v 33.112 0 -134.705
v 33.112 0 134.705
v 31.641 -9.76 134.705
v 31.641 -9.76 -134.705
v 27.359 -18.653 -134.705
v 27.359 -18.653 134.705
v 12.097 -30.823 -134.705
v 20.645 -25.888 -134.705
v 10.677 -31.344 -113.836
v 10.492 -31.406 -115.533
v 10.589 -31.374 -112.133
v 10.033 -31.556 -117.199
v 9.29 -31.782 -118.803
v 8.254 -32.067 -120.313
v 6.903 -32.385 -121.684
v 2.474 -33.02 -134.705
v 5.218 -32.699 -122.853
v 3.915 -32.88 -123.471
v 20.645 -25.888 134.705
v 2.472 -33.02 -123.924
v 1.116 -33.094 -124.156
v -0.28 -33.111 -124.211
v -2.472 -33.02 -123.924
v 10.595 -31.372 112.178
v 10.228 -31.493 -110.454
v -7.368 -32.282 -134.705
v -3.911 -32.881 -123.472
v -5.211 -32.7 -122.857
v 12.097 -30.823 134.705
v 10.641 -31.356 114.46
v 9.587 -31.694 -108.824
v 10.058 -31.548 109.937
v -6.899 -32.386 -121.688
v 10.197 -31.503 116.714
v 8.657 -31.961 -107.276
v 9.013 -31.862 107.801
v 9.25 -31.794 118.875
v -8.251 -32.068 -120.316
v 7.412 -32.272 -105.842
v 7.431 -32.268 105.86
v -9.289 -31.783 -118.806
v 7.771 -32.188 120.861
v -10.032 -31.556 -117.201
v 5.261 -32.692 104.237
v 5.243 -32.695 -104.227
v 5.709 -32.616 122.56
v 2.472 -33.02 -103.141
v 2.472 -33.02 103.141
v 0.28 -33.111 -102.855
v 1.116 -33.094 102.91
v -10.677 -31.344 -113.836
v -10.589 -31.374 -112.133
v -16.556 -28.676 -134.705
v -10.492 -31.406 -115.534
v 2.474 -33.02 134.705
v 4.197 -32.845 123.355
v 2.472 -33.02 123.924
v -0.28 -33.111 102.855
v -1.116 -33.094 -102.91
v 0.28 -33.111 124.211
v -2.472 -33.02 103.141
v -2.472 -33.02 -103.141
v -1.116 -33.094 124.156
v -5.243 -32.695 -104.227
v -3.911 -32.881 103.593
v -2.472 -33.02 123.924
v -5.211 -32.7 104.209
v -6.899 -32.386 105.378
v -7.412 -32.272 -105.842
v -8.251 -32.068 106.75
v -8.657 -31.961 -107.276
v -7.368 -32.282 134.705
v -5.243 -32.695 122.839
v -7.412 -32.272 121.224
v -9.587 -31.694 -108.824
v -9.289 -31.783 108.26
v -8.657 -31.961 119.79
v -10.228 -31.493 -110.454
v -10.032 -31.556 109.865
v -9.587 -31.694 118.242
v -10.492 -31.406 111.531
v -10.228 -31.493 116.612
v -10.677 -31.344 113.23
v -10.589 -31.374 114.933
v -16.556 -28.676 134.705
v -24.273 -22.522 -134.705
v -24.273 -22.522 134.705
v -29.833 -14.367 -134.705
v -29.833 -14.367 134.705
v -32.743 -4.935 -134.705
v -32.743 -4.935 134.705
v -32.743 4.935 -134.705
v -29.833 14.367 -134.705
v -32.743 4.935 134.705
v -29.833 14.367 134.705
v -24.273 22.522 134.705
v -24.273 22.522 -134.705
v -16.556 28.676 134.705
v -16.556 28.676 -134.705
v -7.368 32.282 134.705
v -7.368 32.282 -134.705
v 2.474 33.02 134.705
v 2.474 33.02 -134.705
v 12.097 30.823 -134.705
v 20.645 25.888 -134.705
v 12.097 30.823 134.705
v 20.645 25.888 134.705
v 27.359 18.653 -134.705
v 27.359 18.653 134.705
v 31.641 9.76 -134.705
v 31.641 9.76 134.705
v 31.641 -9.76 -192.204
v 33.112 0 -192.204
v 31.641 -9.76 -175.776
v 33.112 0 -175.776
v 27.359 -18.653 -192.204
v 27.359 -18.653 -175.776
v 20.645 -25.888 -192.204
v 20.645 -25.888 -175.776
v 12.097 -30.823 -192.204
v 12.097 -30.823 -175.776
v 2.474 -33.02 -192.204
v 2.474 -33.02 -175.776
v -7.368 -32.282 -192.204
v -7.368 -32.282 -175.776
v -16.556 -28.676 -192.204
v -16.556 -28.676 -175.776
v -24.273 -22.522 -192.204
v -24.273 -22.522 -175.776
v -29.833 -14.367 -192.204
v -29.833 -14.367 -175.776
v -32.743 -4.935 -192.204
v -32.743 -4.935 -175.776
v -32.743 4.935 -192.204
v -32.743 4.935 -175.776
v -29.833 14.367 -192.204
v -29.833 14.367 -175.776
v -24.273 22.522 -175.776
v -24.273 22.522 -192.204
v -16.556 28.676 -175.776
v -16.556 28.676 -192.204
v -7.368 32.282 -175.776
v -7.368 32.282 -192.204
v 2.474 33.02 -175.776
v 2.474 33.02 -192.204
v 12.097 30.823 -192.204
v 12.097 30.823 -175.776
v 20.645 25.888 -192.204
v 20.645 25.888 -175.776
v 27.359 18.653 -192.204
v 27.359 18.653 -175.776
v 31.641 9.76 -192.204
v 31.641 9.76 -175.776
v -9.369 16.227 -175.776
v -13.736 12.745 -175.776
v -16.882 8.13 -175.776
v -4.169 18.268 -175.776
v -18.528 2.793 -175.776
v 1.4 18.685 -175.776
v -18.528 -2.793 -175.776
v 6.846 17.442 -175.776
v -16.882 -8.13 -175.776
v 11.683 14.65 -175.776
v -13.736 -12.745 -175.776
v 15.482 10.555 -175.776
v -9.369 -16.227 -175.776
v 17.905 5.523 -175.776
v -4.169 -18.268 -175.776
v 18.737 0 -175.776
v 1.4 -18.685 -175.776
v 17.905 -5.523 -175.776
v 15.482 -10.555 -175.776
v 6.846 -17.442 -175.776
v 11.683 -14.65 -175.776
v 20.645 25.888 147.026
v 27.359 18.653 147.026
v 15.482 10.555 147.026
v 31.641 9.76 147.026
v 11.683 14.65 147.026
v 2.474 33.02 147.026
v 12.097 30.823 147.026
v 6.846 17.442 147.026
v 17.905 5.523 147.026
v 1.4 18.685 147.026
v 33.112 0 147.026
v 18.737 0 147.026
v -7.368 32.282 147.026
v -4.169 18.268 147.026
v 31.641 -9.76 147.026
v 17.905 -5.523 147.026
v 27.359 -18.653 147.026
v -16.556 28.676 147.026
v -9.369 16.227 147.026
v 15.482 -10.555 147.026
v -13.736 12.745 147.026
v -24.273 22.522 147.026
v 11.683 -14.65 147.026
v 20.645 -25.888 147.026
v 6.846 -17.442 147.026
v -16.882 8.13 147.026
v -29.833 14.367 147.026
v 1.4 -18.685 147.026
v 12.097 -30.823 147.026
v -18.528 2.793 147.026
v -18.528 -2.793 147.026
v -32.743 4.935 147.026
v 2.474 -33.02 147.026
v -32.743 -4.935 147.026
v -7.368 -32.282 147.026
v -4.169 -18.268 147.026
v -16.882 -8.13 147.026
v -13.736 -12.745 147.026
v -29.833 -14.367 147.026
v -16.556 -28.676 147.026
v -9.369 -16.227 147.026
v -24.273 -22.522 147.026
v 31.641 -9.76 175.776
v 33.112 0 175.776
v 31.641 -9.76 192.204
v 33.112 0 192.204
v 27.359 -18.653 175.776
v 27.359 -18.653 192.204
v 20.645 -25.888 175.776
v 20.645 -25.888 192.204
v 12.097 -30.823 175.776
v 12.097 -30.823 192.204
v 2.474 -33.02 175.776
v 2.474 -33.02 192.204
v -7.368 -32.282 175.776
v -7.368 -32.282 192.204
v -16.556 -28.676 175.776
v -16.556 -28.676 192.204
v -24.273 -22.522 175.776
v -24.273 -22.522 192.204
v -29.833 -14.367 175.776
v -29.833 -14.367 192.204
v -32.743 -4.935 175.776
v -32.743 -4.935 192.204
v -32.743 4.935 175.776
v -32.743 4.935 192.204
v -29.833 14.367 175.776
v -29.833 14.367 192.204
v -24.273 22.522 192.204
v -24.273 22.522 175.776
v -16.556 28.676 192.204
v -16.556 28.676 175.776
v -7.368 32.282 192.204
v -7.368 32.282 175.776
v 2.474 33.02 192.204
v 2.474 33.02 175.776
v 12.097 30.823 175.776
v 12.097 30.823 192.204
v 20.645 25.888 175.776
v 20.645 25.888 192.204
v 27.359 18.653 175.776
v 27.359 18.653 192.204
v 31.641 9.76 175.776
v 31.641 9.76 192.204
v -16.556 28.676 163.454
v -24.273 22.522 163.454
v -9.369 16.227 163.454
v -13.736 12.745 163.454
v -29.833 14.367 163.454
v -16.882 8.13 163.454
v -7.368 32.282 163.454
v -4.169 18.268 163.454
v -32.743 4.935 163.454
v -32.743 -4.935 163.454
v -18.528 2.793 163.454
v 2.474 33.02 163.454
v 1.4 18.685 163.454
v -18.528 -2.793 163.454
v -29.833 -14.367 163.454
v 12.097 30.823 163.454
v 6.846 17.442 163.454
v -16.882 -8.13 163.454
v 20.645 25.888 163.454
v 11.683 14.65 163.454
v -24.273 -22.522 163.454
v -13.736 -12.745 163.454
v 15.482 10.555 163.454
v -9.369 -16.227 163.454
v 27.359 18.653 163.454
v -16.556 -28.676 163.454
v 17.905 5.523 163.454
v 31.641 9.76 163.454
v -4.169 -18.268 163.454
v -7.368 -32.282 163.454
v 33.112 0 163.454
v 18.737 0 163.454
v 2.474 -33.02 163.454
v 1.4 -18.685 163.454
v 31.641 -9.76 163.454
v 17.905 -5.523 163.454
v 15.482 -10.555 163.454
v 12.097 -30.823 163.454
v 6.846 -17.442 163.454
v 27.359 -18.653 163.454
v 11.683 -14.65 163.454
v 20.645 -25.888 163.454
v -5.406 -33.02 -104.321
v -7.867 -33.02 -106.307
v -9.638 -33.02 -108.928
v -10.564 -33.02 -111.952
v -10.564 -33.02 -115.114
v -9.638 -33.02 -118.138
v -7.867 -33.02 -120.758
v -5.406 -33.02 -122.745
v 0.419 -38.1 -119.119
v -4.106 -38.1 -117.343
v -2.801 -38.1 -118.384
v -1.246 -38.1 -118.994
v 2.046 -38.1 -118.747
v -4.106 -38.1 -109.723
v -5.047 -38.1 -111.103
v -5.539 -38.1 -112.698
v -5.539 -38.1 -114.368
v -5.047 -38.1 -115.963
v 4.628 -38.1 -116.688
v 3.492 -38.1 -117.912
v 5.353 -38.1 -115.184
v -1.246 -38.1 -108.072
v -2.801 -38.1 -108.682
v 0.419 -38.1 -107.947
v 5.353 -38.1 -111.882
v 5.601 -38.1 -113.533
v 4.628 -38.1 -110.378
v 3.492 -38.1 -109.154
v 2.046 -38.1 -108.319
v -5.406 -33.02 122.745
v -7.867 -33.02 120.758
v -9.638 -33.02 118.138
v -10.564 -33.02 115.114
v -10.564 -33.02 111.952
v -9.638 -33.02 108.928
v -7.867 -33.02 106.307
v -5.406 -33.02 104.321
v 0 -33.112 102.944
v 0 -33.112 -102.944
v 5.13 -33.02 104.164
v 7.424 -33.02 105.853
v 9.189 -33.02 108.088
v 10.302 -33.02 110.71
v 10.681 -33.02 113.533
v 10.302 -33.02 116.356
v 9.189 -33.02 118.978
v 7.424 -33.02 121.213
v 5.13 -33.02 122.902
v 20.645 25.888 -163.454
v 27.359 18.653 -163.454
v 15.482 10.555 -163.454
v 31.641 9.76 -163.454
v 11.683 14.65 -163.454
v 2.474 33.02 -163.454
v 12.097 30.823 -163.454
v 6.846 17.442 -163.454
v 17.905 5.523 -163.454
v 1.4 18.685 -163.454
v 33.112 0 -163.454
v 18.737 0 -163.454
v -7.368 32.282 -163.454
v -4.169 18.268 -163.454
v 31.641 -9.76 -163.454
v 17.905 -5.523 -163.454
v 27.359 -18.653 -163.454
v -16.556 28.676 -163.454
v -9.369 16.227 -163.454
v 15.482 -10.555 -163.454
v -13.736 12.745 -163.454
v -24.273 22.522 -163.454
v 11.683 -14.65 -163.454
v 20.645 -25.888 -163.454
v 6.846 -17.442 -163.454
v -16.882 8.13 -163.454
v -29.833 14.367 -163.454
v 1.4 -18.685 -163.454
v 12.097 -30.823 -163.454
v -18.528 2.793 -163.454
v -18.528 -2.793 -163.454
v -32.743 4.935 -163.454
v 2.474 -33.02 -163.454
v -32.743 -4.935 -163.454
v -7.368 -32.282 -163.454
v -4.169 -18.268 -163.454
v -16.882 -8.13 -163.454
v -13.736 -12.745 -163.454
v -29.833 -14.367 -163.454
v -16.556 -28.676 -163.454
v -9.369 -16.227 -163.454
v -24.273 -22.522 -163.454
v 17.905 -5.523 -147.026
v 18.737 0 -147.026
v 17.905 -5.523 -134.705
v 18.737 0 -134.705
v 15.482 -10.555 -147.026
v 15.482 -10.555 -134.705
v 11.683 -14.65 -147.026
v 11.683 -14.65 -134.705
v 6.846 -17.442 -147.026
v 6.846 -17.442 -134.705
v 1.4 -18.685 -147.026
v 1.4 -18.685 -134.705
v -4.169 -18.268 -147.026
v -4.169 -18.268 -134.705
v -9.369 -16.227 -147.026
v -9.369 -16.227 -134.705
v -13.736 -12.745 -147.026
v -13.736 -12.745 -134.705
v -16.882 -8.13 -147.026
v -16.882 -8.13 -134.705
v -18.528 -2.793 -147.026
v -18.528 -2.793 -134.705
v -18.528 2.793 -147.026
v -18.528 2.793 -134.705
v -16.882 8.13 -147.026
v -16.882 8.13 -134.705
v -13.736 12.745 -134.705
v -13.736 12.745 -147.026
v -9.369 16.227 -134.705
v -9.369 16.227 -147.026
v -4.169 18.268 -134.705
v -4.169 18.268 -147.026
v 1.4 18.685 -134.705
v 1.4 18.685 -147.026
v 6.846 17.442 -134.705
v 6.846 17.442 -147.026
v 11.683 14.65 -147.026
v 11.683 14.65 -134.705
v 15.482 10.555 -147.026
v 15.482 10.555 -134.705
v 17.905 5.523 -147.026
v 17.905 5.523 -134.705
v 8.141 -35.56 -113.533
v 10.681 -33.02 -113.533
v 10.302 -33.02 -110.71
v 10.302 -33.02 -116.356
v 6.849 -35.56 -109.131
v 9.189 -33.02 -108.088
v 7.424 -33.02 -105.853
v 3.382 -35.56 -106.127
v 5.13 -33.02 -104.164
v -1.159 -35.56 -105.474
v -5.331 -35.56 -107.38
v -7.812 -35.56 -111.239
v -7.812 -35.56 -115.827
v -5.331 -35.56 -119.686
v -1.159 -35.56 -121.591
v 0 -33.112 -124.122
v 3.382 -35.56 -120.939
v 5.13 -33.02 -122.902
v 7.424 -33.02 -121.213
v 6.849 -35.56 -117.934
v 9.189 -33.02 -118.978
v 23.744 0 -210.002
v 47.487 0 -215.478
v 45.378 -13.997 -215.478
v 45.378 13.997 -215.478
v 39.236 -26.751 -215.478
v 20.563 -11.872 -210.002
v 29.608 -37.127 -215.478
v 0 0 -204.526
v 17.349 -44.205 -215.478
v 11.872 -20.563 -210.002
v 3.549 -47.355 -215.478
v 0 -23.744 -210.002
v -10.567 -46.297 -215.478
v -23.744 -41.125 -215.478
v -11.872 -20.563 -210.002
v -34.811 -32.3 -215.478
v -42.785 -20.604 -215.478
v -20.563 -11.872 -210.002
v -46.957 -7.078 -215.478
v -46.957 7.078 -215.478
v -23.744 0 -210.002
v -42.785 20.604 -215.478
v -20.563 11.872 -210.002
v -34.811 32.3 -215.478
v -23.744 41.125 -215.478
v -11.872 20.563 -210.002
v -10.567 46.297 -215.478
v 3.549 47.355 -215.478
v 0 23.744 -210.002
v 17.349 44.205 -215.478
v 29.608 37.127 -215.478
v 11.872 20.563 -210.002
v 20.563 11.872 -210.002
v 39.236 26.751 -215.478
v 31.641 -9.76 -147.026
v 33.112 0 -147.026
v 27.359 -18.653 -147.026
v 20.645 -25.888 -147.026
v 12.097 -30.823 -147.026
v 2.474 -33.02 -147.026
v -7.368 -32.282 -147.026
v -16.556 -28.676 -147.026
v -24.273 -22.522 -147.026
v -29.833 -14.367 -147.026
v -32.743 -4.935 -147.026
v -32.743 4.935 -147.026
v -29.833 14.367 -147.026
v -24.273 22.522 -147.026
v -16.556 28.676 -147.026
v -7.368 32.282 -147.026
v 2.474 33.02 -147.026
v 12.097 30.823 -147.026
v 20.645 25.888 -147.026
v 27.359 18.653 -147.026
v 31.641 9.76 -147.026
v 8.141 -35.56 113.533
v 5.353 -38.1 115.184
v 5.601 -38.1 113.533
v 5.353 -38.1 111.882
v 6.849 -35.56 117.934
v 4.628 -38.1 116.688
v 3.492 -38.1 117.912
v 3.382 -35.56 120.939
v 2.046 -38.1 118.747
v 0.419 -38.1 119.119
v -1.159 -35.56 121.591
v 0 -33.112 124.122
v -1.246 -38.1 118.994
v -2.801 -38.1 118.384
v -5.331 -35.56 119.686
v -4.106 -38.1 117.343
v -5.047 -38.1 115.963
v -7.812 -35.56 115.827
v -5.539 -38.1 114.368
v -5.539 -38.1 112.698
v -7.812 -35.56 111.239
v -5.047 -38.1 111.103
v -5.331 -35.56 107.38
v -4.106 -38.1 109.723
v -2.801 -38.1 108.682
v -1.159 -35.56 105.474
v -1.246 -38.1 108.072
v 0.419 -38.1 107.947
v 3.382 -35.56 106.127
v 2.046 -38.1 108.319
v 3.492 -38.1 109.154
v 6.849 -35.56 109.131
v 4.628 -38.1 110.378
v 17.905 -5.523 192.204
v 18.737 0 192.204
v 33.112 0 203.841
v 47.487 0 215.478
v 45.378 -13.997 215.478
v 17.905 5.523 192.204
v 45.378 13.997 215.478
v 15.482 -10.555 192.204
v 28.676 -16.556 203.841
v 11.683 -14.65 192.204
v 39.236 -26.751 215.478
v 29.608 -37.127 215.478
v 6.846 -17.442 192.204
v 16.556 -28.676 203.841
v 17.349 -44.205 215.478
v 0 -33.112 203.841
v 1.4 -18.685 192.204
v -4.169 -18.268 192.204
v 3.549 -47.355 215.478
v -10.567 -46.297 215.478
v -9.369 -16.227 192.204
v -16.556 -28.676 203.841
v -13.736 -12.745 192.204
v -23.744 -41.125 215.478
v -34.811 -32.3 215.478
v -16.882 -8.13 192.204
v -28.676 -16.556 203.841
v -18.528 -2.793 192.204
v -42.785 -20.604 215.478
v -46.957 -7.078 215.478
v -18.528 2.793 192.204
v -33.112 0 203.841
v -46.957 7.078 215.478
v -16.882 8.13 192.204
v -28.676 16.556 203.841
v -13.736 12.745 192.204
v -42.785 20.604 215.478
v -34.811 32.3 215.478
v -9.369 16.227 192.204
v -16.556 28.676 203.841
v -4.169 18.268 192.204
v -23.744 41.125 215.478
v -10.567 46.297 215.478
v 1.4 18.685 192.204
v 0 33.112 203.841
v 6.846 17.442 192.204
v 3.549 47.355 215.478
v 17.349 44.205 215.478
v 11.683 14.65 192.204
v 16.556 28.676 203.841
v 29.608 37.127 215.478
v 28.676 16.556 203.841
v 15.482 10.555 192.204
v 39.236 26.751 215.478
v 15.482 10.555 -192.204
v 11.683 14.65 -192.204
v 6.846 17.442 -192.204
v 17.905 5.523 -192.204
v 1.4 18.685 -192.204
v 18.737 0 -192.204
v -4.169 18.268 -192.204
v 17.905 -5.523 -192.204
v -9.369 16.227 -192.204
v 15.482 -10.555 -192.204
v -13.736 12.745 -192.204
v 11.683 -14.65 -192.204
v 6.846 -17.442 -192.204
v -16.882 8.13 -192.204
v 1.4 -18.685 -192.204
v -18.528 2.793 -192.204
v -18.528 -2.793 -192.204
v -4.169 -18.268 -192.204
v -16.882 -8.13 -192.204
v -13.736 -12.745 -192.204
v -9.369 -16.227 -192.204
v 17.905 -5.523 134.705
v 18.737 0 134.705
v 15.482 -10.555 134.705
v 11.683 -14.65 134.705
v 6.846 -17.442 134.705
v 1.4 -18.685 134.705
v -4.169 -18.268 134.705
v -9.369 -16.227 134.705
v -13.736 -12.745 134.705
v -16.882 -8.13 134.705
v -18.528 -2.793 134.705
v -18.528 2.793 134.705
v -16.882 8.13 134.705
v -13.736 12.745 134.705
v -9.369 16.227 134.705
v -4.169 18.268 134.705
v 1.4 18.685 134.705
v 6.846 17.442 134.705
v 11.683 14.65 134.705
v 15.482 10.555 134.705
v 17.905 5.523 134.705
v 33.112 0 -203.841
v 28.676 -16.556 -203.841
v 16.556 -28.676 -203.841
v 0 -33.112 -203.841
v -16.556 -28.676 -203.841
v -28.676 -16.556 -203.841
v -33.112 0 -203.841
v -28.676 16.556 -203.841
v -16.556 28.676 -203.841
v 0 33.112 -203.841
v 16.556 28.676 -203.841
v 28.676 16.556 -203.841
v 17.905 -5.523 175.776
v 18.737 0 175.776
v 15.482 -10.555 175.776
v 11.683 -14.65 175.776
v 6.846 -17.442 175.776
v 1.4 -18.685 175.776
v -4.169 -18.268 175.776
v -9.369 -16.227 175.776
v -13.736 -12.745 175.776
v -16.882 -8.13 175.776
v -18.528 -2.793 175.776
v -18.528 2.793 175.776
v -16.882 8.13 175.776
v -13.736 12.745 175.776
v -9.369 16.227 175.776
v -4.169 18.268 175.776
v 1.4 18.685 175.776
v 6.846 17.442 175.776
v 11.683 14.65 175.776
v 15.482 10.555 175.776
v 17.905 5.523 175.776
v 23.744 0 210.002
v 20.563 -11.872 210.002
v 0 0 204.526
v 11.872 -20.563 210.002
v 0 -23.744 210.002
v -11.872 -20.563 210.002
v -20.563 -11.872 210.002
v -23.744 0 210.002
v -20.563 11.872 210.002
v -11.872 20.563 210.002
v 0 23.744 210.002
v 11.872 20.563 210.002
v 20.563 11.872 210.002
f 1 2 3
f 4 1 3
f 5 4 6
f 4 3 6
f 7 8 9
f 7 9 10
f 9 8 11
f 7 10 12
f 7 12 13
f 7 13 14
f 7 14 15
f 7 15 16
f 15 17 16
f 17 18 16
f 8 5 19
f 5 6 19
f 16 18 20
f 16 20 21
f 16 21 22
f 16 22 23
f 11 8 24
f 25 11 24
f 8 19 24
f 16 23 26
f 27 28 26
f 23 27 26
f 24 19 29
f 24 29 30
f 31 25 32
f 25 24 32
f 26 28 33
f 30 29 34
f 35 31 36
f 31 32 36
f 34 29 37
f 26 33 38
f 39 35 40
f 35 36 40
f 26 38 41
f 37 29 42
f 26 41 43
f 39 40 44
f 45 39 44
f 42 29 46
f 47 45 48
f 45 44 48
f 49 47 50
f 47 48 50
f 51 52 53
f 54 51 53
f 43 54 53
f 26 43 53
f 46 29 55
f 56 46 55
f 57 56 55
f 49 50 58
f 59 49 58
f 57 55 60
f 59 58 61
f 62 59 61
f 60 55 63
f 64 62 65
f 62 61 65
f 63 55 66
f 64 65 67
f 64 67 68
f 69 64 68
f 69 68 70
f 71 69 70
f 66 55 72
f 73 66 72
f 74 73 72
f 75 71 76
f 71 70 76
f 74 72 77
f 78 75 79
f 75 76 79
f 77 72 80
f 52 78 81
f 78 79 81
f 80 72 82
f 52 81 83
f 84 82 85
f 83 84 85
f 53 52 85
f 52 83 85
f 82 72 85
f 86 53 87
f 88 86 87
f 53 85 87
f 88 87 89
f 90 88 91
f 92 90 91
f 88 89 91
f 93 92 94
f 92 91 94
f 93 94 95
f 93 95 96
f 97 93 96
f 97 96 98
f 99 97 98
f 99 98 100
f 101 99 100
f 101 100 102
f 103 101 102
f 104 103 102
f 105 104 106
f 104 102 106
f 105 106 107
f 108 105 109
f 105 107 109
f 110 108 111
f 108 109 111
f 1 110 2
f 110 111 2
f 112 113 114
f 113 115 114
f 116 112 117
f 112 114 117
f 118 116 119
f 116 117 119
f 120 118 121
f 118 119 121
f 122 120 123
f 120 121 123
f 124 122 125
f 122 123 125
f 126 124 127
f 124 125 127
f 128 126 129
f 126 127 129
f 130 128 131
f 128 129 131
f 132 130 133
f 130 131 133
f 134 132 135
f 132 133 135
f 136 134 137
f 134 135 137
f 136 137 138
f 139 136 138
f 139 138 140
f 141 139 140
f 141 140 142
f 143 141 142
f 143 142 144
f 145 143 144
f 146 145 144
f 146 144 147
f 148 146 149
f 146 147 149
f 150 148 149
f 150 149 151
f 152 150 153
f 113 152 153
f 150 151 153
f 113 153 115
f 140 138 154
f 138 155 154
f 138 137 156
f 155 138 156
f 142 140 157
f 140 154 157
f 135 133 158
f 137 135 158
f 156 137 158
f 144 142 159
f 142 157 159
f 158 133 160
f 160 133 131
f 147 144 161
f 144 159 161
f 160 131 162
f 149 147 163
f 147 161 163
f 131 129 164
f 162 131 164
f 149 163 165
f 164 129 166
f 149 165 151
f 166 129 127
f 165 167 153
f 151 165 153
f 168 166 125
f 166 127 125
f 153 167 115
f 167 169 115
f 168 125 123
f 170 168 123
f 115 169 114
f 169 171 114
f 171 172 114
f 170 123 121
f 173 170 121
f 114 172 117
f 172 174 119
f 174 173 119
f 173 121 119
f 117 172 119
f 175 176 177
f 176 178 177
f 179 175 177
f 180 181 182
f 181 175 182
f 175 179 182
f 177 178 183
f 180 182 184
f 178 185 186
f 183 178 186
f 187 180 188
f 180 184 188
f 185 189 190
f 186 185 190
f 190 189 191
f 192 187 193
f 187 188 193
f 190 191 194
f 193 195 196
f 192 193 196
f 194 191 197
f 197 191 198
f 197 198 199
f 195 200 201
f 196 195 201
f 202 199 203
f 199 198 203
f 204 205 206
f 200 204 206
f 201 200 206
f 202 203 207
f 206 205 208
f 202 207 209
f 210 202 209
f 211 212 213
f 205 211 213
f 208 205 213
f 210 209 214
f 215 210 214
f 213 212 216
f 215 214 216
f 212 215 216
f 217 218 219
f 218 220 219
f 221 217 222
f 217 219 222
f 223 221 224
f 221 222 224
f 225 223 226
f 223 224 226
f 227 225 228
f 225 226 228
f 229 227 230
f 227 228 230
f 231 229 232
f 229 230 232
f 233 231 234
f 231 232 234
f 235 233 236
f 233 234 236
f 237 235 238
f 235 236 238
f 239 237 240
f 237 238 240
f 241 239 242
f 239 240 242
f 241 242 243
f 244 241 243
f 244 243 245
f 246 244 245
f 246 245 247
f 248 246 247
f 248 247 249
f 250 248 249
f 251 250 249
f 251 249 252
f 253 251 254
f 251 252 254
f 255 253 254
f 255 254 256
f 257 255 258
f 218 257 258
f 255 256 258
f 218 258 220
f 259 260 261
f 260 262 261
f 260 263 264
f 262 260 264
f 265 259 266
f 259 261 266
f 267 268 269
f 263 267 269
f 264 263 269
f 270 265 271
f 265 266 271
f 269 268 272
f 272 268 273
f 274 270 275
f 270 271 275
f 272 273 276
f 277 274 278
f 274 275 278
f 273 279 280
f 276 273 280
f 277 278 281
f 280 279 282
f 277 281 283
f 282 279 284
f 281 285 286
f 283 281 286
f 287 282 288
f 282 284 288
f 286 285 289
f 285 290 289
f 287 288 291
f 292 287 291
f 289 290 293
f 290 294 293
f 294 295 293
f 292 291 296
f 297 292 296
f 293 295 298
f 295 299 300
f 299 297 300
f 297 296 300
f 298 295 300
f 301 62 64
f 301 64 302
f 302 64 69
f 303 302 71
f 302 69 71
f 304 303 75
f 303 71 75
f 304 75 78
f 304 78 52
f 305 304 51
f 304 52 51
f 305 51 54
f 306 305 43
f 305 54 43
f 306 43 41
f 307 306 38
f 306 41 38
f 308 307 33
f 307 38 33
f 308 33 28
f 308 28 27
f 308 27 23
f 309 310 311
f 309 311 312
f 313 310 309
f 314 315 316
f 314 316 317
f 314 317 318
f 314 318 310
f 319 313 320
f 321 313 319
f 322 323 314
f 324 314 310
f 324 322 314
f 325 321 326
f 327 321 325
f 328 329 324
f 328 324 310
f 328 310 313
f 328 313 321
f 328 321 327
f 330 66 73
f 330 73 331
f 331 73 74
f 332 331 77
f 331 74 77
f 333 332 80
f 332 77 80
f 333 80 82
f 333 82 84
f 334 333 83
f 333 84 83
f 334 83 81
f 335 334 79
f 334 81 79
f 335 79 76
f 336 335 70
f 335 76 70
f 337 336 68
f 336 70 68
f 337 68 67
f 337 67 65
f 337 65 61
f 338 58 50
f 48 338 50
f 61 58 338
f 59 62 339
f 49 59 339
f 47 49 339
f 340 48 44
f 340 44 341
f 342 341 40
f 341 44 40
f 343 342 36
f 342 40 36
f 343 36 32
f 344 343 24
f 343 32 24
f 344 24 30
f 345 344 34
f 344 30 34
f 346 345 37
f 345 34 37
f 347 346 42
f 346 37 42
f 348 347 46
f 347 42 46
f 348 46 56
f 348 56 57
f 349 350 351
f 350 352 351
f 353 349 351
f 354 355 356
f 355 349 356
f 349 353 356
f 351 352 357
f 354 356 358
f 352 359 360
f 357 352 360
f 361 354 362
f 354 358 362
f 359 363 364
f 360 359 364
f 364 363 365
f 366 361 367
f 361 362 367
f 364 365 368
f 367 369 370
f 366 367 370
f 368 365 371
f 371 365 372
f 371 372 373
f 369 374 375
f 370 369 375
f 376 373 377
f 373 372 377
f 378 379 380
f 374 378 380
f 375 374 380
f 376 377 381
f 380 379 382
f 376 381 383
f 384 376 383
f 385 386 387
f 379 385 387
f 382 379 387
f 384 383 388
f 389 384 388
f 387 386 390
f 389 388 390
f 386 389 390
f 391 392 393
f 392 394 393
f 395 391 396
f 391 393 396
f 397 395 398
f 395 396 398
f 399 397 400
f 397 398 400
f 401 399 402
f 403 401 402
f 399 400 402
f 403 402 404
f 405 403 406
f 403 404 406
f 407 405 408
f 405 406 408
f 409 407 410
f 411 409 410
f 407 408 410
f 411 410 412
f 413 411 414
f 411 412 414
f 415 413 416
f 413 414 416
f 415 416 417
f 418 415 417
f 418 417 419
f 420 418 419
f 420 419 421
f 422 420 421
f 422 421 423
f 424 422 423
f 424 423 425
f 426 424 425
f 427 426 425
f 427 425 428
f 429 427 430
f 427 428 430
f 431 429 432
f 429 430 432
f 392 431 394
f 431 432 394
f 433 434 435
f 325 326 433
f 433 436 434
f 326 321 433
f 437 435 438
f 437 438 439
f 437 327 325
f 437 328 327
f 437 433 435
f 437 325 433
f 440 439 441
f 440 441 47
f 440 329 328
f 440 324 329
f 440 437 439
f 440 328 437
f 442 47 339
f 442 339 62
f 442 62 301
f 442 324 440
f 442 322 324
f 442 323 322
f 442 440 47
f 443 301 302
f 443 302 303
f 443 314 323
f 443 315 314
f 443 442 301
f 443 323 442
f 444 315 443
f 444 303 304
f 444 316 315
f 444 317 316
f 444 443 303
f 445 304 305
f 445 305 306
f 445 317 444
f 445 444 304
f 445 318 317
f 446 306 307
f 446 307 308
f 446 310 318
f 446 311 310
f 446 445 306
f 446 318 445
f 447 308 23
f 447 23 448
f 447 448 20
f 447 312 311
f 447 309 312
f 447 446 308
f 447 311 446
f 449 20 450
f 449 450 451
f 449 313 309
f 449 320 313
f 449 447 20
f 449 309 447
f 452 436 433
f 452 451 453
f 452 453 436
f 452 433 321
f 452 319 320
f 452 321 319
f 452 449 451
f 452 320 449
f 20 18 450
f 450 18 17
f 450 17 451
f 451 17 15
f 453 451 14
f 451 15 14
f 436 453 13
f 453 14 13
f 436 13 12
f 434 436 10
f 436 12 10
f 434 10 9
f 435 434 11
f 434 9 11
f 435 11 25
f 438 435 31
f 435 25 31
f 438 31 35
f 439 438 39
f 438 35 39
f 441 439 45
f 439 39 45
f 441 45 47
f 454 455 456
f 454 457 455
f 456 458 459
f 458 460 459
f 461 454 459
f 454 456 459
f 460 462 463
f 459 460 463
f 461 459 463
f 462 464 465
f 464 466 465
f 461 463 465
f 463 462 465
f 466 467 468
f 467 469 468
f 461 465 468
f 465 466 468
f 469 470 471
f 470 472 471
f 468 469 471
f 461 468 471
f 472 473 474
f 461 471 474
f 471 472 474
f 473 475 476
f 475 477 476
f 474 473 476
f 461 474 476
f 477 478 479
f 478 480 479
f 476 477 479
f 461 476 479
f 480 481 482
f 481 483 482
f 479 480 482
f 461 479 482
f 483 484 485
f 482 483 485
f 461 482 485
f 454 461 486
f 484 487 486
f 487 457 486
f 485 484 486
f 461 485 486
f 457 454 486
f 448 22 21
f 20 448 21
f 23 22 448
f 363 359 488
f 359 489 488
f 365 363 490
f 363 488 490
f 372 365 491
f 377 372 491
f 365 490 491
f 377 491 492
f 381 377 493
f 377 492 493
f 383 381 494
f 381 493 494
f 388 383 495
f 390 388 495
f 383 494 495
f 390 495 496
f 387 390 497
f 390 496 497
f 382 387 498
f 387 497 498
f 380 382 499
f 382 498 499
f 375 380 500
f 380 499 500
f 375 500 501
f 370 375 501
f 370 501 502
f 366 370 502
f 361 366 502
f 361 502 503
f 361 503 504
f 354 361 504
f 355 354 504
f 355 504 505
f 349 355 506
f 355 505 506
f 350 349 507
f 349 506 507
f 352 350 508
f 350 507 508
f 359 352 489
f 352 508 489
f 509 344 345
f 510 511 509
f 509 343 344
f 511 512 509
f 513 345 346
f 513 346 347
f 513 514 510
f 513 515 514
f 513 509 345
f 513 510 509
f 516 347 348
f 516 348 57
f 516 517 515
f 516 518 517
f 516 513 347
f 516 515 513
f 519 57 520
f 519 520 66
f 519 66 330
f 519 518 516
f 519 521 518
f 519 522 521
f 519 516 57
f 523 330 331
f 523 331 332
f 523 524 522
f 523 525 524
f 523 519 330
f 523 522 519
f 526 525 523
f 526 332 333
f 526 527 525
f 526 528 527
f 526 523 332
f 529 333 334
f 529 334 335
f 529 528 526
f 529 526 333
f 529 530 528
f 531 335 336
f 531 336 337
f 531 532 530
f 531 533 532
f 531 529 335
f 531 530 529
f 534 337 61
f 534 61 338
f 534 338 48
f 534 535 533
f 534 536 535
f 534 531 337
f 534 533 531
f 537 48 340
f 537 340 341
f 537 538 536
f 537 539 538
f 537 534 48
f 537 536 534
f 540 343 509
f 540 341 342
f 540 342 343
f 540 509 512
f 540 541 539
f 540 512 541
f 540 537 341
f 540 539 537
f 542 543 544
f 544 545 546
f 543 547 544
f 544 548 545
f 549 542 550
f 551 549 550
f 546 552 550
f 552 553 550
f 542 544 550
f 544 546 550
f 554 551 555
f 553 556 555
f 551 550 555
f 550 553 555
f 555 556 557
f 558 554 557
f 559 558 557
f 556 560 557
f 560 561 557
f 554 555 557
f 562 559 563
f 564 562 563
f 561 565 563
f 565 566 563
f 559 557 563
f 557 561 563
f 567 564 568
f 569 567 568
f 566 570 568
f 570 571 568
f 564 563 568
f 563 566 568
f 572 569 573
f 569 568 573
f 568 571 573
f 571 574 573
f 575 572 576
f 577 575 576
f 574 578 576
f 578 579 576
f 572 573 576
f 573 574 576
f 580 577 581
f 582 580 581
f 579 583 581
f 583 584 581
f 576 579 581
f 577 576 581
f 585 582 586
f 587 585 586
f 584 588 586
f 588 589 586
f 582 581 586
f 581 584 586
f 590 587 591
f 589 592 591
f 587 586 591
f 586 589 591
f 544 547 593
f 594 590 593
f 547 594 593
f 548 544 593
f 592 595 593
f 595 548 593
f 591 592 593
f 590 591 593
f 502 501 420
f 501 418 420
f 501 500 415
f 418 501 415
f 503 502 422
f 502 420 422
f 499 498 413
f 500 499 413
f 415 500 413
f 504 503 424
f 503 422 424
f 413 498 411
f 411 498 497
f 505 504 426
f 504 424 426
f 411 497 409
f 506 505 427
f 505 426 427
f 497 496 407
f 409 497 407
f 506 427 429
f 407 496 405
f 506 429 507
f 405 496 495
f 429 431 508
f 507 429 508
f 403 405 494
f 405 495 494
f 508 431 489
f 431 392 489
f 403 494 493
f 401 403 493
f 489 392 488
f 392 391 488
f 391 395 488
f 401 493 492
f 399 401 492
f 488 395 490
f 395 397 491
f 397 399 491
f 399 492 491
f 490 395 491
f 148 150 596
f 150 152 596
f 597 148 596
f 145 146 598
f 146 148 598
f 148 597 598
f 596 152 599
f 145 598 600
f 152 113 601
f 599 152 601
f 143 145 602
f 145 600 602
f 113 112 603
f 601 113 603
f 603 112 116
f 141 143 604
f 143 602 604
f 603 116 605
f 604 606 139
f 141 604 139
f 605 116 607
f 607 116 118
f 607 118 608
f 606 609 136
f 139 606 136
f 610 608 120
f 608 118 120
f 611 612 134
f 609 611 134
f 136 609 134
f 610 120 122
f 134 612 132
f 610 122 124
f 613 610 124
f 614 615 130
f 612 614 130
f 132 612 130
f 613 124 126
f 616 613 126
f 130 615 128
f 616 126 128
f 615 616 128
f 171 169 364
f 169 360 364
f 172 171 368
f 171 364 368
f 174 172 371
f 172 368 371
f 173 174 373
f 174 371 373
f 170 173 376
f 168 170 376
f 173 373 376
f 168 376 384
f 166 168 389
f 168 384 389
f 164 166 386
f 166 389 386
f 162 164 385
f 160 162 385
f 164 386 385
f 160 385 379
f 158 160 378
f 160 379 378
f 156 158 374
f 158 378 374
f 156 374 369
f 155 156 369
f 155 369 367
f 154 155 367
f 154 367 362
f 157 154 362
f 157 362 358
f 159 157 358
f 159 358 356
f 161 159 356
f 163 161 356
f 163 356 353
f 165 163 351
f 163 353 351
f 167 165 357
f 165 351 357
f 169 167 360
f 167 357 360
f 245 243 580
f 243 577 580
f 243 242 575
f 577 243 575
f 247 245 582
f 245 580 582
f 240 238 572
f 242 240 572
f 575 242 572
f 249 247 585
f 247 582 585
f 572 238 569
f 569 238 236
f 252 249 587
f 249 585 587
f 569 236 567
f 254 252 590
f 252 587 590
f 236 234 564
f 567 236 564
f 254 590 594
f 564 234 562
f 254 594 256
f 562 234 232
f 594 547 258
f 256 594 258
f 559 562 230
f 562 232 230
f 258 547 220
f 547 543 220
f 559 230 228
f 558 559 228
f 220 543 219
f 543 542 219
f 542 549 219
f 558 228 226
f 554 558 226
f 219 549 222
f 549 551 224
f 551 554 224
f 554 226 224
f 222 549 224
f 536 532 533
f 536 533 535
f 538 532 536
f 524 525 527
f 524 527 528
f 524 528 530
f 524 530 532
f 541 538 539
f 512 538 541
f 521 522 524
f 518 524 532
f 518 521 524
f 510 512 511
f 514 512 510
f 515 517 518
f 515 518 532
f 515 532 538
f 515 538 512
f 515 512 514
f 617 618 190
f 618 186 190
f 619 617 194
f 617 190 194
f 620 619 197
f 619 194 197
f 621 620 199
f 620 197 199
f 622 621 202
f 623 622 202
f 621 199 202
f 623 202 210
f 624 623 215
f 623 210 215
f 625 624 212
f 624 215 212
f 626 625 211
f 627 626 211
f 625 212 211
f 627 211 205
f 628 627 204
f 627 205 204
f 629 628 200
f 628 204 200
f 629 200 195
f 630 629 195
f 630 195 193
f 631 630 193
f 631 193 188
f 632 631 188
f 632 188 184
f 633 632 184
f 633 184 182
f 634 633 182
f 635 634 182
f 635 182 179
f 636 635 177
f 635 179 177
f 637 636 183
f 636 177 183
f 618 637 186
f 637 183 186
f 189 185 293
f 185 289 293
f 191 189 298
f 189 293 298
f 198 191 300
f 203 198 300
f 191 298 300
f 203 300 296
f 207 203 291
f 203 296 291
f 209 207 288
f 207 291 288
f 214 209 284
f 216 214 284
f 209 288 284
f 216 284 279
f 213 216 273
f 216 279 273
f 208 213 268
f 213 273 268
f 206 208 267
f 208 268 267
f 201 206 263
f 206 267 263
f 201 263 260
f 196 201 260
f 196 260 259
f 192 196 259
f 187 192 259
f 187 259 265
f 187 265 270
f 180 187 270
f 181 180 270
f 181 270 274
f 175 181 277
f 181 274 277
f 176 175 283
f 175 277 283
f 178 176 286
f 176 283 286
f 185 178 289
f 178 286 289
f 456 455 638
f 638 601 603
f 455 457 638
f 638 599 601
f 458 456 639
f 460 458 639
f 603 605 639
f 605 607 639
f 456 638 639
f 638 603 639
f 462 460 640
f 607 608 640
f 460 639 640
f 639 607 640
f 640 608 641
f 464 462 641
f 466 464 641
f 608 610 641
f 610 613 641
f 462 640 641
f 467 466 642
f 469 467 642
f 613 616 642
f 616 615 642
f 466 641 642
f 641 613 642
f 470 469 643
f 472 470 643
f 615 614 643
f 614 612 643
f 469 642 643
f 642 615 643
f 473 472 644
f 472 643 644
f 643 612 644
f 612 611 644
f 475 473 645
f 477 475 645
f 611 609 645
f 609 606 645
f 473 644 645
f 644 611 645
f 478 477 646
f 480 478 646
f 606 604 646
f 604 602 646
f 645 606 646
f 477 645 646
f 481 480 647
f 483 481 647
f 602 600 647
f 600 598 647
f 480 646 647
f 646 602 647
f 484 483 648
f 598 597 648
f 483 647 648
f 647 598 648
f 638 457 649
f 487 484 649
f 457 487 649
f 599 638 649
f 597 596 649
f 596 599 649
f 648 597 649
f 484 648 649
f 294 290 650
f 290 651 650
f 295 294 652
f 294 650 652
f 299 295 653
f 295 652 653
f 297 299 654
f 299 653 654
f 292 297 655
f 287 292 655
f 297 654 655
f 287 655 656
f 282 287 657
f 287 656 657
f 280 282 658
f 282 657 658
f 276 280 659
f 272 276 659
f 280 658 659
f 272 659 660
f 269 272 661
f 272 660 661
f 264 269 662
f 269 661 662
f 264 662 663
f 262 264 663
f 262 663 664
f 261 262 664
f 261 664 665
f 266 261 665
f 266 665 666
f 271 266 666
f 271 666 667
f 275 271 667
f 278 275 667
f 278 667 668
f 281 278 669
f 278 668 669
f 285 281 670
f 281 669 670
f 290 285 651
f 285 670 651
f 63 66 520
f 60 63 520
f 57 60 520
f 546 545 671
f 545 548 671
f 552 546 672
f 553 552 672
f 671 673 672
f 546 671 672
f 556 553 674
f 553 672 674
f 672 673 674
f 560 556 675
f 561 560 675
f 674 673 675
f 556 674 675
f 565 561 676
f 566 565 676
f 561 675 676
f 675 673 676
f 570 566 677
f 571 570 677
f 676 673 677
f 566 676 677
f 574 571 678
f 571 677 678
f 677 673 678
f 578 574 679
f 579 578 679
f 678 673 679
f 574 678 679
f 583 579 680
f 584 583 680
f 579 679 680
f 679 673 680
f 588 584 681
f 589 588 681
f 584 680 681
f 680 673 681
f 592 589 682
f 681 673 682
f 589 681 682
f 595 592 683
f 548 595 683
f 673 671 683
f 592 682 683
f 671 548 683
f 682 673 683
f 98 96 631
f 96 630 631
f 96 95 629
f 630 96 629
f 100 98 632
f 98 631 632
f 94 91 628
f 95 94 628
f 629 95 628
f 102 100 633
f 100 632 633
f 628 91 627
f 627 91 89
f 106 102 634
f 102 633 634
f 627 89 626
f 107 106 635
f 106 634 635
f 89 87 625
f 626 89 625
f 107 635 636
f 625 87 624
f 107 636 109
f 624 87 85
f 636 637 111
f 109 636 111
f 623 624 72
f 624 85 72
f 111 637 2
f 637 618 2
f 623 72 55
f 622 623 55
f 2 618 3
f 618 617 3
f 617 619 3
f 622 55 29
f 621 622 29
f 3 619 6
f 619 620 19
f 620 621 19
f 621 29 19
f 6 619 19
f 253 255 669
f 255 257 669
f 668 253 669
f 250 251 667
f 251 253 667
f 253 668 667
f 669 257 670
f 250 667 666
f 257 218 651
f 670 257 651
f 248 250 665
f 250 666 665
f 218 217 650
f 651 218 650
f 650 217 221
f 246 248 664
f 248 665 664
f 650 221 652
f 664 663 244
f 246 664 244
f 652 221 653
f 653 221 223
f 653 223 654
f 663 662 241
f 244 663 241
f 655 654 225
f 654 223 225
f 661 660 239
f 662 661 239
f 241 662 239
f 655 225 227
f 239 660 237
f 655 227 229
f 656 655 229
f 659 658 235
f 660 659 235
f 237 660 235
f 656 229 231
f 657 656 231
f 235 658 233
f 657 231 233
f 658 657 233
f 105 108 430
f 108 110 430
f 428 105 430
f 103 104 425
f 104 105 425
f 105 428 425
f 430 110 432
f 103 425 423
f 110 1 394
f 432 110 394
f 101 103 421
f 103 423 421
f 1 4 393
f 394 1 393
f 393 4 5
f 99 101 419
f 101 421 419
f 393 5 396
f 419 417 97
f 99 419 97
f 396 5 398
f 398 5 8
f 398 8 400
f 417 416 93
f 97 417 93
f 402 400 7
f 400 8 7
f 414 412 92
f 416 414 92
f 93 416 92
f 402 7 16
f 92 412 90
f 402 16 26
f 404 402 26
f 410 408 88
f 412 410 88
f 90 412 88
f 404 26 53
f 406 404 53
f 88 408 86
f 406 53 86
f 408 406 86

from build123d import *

# Parameters (mm, degrees)
F2_R         = 10.6813712462
F3_DEPTH     = 38.1
F4_S5_R      = 33.1123778597
F4_T6_DEPTH  = 17
F4_S11_R     = 33.1123778597
F4_T12_DEPTH = 17


# Not quite as in the source:
# - a fillet or chamfer that OpenCascade refuses, or shapes differently, is made with other operations: its cross-section is extruded or revolved along the edge and cut away or added


with BuildPart() as f1:
    # F0 (on Front) → F1 (revolve)
    with BuildSketch(Plane.XZ):
        Polygon((33.1123778597, 0), (0, 0), (0, -204.5256793499), (47.4873222411, -215.4780179262), (18.7374334782, -192.2043114901), (33.1123778597, -192.2043114901), (33.1123778597, -175.7757812738), (18.7374334782, -175.7757812738), (18.7374334782, -163.4543985128), (33.1123778597, -163.4543985128), (33.1123778597, -147.0258831978), (18.7374334782, -147.0258831978), (18.7374334782, -134.7045004368), (33.1123778597, -134.7045004368), align=None)
        Polygon((0, 204.5256793499), (0, 0), (33.1123778597, 0), (33.1123778597, 134.7045004368), (18.7374334782, 134.7045004368), (18.7374334782, 147.0258831978), (33.1123778597, 147.0258831978), (33.1123778597, 163.4543985128), (18.7374334782, 163.4543985128), (18.7374334782, 175.7757812738), (33.1123778597, 175.7757812738), (33.1123778597, 192.2043114901), (18.7374334782, 192.2043114901), (47.4873222411, 215.4780179262), align=None)
    revolve(axis=Axis((0, 0, -102.2628396749), (0, 0, -1)))

    # F2 (on Front) → F3 (join)
    with BuildSketch(Plane.XZ):
        with Locations((0, 113.5328859091)):
            Circle(F2_R)
        with Locations((0, -113.5328859091)):
            Circle(F2_R)
    extrude(amount=F3_DEPTH)

    # F4: chamfer of 5.08 on 2 edges, made by hand


with BuildPart() as f4_tool2:
    # F4_s3 → F4_t4 (revolve)
    with BuildSketch(Plane.XY.offset(113.5328859091)):
        Polygon((10.6813712462, -33.02), (5.6013712462, -38.1), (10.6813712462, -38.1), align=None)
    revolve(axis=Axis((0, -38.1, 113.5328859091), (0, -1, 0)))

    # F4_s5 → F4_t6 (cut, symmetric)
    with BuildSketch(Plane.XY.offset(113.5)):
        Circle(F4_S5_R)
    extrude(amount=F4_T6_DEPTH, both=True, mode=Mode.SUBTRACT)


with BuildPart() as f1_1:
    add(f1.part)

    # F4_t1: cut F4_tool2
    add(f4_tool2.part, mode=Mode.SUBTRACT)


with BuildPart() as f4_tool8:
    # F4_s9 → F4_t10 (revolve)
    with BuildSketch(Plane.XY.offset(-113.5328859091)):
        Polygon((10.6813712462, -33.02), (5.6013712462, -38.1), (10.6813712462, -38.1), align=None)
    revolve(axis=Axis((0, -38.1, -113.5328859091), (0, -1, 0)))

    # F4_s11 → F4_t12 (cut, symmetric)
    with BuildSketch(Plane.XY.offset(-113.5)):
        Circle(F4_S11_R)
    extrude(amount=F4_T12_DEPTH, both=True, mode=Mode.SUBTRACT)


with BuildPart() as f1_2:
    add(f1_1.part)

    # F4_t7: cut F4_tool8
    add(f4_tool8.part, mode=Mode.SUBTRACT)


solid = f1_2.part
